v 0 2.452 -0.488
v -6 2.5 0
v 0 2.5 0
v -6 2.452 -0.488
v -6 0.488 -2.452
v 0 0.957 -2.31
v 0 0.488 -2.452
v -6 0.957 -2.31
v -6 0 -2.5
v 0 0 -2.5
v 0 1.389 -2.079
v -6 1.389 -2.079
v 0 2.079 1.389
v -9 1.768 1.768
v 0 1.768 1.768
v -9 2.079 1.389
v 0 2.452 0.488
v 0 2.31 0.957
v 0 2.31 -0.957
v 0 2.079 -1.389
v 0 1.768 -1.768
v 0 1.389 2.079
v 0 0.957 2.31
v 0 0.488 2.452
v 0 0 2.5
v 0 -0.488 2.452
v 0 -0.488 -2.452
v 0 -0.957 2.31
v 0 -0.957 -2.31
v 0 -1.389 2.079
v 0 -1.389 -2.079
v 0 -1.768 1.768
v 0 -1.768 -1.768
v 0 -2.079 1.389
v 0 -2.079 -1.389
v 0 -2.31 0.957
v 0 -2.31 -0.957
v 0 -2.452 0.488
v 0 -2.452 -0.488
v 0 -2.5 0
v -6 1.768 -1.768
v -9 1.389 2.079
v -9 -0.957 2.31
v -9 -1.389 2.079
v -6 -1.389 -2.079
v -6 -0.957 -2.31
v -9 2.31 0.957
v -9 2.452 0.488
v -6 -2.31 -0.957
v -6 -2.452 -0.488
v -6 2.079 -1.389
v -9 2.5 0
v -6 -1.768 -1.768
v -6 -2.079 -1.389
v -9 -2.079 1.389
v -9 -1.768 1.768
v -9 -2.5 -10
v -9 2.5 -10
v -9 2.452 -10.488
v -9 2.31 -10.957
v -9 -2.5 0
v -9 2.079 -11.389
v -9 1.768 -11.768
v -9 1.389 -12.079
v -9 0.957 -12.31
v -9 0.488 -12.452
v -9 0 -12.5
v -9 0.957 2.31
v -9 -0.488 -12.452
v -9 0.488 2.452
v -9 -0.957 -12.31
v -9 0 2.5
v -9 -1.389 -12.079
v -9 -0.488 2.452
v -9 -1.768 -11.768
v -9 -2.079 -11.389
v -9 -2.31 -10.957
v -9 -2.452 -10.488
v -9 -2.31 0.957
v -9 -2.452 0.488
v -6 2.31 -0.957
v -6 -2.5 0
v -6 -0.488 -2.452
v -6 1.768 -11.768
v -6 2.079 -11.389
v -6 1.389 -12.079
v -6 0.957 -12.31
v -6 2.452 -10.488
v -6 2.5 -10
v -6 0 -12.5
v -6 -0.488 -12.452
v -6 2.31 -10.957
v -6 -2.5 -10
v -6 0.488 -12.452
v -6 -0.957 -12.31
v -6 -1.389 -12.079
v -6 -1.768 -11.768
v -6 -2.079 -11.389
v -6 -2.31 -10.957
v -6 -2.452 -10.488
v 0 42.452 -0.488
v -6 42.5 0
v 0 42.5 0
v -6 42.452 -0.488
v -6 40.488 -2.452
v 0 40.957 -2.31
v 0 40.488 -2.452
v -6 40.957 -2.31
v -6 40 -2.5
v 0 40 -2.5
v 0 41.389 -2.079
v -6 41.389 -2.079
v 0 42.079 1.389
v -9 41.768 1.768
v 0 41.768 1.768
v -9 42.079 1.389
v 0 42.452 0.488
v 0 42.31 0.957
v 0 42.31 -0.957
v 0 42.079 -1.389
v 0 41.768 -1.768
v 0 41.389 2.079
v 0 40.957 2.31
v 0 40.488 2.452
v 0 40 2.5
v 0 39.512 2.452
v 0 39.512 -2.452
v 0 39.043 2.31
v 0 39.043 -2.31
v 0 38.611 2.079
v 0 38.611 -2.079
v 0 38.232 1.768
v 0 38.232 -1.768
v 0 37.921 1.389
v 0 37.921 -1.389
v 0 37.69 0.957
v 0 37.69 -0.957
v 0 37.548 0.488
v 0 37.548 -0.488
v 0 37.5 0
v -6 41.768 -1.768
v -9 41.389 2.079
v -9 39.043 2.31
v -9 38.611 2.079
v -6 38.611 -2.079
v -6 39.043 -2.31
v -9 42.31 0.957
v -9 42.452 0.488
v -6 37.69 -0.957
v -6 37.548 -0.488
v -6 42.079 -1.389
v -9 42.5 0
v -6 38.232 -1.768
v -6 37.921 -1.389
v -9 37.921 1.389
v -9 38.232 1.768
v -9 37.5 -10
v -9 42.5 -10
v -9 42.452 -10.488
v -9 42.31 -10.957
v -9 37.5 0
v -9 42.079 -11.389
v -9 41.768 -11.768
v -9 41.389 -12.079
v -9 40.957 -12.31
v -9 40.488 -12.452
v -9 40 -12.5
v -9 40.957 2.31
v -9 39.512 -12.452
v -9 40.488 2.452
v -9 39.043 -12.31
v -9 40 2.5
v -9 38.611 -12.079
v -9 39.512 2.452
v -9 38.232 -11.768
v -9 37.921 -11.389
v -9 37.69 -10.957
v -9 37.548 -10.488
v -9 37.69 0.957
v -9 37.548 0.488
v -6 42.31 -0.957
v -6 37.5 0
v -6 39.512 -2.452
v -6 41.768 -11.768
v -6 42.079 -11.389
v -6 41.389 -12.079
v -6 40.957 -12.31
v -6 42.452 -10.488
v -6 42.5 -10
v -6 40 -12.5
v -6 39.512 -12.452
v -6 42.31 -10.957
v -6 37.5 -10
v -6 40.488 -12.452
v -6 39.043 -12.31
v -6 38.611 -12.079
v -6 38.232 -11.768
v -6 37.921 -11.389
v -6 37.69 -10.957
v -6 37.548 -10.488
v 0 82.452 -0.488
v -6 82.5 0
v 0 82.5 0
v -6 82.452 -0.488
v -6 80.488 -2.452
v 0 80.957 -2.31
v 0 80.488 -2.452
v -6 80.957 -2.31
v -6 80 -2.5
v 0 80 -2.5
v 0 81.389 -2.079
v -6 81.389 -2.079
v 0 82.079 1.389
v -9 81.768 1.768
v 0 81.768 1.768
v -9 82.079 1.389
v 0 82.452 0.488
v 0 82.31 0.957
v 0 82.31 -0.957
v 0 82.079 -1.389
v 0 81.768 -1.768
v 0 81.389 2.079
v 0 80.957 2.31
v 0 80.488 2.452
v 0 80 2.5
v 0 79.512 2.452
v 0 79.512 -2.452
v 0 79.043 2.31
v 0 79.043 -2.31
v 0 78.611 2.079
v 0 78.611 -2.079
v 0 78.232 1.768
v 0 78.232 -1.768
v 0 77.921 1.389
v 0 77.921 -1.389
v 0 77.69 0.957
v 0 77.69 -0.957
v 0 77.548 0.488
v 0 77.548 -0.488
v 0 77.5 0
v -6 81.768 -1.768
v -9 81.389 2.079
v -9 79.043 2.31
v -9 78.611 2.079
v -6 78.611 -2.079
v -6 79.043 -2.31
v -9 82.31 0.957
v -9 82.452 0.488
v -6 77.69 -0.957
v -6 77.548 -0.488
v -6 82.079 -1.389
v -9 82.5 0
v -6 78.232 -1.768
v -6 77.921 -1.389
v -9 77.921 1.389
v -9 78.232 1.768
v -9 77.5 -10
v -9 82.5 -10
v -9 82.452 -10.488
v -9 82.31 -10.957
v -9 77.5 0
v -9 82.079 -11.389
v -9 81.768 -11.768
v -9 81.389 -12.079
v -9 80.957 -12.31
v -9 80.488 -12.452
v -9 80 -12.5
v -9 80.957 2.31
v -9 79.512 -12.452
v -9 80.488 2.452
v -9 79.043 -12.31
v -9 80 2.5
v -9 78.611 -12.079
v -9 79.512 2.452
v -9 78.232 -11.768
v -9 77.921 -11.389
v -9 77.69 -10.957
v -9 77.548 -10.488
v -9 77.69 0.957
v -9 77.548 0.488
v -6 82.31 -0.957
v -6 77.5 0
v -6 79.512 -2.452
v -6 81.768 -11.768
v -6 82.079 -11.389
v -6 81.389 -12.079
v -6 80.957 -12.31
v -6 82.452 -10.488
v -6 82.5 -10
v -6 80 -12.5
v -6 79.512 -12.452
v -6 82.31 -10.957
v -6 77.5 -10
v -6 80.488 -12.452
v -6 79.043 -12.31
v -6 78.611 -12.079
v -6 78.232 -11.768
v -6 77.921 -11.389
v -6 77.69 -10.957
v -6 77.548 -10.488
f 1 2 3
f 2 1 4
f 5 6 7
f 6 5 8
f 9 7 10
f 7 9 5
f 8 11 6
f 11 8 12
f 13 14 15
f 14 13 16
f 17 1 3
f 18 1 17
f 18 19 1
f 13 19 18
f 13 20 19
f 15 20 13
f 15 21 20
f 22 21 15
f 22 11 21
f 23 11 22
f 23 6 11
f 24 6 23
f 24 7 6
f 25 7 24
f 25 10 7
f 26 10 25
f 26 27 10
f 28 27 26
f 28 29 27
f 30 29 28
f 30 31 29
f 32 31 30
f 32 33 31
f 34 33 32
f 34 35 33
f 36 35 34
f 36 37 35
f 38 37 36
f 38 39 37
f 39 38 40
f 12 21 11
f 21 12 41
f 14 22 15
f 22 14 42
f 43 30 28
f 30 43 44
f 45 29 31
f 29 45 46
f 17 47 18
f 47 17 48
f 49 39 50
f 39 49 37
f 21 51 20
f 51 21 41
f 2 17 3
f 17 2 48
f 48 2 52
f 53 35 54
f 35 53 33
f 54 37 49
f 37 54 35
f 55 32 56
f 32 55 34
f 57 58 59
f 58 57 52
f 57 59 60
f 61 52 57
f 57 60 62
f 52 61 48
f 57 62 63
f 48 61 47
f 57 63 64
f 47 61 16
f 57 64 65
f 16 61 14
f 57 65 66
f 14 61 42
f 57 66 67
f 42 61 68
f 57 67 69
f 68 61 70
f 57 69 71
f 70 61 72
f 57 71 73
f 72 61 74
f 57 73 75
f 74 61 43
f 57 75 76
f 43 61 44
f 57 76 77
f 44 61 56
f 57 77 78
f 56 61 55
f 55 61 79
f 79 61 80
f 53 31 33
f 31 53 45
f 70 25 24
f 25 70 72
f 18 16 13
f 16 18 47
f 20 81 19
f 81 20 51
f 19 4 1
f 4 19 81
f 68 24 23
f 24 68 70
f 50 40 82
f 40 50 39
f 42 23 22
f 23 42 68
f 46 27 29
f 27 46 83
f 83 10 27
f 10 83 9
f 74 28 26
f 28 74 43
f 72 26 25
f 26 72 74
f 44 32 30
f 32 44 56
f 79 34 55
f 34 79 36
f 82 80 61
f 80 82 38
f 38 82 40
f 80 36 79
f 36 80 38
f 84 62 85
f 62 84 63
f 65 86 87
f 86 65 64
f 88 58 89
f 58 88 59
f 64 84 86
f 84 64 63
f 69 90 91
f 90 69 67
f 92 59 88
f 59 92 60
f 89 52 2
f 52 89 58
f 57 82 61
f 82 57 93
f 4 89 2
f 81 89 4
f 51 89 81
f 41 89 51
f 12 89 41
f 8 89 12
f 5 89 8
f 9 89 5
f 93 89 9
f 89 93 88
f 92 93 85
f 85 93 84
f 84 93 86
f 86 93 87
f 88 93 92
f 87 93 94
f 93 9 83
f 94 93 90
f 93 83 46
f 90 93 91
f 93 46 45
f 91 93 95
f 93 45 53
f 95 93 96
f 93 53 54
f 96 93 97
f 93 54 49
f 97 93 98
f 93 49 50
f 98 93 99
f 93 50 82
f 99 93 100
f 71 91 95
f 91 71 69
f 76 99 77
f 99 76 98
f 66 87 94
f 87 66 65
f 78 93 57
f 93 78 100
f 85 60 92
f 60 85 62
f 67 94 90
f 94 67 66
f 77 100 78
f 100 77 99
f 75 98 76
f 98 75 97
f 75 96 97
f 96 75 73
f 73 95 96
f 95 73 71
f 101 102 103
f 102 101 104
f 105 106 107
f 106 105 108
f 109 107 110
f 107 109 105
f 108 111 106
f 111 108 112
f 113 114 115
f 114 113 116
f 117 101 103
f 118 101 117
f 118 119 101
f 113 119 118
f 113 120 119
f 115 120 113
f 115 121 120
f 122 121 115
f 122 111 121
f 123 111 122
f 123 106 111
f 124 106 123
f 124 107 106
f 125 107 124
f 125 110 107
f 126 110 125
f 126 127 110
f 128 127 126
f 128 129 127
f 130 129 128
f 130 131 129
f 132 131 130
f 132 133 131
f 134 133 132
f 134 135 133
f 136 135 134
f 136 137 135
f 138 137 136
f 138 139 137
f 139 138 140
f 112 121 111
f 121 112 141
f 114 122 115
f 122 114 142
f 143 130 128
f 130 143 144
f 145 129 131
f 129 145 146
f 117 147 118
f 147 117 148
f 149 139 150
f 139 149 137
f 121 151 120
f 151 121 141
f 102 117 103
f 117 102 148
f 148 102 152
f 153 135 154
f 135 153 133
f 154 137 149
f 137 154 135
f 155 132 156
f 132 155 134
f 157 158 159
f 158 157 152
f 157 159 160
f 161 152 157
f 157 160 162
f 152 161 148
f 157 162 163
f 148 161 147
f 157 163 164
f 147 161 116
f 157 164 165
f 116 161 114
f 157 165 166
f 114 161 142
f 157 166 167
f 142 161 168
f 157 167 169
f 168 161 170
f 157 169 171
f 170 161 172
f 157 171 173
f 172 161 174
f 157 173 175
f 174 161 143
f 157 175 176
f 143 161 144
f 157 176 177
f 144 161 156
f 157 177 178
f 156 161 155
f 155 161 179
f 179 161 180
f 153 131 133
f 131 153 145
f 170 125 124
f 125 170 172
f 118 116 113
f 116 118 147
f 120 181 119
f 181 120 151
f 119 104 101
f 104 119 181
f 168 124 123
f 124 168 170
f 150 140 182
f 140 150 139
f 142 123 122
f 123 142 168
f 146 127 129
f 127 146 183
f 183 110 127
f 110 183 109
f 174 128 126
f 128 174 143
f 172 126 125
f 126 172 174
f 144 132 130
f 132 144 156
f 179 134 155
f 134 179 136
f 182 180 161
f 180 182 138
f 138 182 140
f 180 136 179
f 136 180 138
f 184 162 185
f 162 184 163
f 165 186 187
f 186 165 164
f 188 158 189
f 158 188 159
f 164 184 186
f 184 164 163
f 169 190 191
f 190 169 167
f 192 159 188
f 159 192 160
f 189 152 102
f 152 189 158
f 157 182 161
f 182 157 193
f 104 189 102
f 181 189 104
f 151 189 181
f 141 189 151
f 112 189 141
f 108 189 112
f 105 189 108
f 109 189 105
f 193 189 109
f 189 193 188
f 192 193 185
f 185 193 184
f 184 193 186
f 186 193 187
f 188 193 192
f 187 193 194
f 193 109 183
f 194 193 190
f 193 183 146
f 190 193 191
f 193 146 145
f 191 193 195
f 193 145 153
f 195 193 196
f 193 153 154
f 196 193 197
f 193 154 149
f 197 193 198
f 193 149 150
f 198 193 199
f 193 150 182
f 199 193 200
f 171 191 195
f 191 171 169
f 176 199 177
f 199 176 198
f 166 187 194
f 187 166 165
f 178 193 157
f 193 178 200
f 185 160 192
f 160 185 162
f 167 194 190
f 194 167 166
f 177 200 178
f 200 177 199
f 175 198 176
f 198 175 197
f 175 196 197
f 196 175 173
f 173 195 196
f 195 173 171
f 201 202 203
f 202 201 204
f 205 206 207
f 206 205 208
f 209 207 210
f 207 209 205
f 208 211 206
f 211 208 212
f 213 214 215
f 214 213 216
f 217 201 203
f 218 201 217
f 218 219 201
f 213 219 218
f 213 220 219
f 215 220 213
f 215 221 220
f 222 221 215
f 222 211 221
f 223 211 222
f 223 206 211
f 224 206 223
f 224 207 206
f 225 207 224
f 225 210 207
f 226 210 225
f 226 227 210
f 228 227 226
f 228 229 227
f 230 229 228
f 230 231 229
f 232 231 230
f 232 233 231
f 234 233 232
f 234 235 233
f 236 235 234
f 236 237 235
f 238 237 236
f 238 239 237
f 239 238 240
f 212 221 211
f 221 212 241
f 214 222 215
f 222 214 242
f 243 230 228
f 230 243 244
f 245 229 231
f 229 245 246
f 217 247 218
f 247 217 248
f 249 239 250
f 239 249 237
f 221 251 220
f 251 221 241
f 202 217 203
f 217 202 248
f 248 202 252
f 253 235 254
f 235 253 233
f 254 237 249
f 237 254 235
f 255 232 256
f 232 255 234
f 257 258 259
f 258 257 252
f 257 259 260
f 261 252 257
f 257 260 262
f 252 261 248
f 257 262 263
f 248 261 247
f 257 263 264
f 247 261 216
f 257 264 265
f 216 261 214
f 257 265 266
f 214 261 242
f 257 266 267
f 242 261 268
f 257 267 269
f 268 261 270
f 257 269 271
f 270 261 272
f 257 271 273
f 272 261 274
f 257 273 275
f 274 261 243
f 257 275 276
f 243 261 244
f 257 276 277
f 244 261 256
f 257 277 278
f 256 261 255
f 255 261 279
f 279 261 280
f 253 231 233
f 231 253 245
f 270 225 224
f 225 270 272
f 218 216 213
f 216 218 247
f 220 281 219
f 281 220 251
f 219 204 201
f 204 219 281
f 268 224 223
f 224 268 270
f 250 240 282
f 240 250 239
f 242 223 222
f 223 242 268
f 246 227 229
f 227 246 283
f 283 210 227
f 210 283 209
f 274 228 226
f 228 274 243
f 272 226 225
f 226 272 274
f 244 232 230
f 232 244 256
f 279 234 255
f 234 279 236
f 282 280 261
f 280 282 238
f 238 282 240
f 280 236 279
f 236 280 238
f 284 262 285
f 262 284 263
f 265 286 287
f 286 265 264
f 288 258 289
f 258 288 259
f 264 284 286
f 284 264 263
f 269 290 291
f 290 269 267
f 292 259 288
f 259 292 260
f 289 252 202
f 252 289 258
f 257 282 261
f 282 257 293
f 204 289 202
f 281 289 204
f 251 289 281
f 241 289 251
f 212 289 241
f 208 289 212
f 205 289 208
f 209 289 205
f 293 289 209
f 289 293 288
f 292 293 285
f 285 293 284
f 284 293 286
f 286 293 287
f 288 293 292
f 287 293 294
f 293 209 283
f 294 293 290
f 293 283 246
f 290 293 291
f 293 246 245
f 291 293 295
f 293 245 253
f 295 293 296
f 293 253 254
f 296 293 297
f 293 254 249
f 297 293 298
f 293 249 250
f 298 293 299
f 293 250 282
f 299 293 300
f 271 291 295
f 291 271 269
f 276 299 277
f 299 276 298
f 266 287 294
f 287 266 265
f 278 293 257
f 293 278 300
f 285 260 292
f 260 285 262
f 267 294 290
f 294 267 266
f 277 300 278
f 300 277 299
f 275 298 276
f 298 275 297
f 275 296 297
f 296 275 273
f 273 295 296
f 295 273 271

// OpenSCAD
module ganchos(n=1){    
    for (i=[0:1:n-1]){
        translate([0,40*i,,0]) rotate([0, 90, 0]) translate([0, 0, -9]) {
            cylinder(d = 5, h=9, $fn = 32);
            hull(){
                cylinder(d = 5, h=3, $fn = 32);
                translate([10, 0, 0]) cylinder(d = 5, h=3, $fn = 32);
            } 
        }
    }   
}

ganchos(3);
